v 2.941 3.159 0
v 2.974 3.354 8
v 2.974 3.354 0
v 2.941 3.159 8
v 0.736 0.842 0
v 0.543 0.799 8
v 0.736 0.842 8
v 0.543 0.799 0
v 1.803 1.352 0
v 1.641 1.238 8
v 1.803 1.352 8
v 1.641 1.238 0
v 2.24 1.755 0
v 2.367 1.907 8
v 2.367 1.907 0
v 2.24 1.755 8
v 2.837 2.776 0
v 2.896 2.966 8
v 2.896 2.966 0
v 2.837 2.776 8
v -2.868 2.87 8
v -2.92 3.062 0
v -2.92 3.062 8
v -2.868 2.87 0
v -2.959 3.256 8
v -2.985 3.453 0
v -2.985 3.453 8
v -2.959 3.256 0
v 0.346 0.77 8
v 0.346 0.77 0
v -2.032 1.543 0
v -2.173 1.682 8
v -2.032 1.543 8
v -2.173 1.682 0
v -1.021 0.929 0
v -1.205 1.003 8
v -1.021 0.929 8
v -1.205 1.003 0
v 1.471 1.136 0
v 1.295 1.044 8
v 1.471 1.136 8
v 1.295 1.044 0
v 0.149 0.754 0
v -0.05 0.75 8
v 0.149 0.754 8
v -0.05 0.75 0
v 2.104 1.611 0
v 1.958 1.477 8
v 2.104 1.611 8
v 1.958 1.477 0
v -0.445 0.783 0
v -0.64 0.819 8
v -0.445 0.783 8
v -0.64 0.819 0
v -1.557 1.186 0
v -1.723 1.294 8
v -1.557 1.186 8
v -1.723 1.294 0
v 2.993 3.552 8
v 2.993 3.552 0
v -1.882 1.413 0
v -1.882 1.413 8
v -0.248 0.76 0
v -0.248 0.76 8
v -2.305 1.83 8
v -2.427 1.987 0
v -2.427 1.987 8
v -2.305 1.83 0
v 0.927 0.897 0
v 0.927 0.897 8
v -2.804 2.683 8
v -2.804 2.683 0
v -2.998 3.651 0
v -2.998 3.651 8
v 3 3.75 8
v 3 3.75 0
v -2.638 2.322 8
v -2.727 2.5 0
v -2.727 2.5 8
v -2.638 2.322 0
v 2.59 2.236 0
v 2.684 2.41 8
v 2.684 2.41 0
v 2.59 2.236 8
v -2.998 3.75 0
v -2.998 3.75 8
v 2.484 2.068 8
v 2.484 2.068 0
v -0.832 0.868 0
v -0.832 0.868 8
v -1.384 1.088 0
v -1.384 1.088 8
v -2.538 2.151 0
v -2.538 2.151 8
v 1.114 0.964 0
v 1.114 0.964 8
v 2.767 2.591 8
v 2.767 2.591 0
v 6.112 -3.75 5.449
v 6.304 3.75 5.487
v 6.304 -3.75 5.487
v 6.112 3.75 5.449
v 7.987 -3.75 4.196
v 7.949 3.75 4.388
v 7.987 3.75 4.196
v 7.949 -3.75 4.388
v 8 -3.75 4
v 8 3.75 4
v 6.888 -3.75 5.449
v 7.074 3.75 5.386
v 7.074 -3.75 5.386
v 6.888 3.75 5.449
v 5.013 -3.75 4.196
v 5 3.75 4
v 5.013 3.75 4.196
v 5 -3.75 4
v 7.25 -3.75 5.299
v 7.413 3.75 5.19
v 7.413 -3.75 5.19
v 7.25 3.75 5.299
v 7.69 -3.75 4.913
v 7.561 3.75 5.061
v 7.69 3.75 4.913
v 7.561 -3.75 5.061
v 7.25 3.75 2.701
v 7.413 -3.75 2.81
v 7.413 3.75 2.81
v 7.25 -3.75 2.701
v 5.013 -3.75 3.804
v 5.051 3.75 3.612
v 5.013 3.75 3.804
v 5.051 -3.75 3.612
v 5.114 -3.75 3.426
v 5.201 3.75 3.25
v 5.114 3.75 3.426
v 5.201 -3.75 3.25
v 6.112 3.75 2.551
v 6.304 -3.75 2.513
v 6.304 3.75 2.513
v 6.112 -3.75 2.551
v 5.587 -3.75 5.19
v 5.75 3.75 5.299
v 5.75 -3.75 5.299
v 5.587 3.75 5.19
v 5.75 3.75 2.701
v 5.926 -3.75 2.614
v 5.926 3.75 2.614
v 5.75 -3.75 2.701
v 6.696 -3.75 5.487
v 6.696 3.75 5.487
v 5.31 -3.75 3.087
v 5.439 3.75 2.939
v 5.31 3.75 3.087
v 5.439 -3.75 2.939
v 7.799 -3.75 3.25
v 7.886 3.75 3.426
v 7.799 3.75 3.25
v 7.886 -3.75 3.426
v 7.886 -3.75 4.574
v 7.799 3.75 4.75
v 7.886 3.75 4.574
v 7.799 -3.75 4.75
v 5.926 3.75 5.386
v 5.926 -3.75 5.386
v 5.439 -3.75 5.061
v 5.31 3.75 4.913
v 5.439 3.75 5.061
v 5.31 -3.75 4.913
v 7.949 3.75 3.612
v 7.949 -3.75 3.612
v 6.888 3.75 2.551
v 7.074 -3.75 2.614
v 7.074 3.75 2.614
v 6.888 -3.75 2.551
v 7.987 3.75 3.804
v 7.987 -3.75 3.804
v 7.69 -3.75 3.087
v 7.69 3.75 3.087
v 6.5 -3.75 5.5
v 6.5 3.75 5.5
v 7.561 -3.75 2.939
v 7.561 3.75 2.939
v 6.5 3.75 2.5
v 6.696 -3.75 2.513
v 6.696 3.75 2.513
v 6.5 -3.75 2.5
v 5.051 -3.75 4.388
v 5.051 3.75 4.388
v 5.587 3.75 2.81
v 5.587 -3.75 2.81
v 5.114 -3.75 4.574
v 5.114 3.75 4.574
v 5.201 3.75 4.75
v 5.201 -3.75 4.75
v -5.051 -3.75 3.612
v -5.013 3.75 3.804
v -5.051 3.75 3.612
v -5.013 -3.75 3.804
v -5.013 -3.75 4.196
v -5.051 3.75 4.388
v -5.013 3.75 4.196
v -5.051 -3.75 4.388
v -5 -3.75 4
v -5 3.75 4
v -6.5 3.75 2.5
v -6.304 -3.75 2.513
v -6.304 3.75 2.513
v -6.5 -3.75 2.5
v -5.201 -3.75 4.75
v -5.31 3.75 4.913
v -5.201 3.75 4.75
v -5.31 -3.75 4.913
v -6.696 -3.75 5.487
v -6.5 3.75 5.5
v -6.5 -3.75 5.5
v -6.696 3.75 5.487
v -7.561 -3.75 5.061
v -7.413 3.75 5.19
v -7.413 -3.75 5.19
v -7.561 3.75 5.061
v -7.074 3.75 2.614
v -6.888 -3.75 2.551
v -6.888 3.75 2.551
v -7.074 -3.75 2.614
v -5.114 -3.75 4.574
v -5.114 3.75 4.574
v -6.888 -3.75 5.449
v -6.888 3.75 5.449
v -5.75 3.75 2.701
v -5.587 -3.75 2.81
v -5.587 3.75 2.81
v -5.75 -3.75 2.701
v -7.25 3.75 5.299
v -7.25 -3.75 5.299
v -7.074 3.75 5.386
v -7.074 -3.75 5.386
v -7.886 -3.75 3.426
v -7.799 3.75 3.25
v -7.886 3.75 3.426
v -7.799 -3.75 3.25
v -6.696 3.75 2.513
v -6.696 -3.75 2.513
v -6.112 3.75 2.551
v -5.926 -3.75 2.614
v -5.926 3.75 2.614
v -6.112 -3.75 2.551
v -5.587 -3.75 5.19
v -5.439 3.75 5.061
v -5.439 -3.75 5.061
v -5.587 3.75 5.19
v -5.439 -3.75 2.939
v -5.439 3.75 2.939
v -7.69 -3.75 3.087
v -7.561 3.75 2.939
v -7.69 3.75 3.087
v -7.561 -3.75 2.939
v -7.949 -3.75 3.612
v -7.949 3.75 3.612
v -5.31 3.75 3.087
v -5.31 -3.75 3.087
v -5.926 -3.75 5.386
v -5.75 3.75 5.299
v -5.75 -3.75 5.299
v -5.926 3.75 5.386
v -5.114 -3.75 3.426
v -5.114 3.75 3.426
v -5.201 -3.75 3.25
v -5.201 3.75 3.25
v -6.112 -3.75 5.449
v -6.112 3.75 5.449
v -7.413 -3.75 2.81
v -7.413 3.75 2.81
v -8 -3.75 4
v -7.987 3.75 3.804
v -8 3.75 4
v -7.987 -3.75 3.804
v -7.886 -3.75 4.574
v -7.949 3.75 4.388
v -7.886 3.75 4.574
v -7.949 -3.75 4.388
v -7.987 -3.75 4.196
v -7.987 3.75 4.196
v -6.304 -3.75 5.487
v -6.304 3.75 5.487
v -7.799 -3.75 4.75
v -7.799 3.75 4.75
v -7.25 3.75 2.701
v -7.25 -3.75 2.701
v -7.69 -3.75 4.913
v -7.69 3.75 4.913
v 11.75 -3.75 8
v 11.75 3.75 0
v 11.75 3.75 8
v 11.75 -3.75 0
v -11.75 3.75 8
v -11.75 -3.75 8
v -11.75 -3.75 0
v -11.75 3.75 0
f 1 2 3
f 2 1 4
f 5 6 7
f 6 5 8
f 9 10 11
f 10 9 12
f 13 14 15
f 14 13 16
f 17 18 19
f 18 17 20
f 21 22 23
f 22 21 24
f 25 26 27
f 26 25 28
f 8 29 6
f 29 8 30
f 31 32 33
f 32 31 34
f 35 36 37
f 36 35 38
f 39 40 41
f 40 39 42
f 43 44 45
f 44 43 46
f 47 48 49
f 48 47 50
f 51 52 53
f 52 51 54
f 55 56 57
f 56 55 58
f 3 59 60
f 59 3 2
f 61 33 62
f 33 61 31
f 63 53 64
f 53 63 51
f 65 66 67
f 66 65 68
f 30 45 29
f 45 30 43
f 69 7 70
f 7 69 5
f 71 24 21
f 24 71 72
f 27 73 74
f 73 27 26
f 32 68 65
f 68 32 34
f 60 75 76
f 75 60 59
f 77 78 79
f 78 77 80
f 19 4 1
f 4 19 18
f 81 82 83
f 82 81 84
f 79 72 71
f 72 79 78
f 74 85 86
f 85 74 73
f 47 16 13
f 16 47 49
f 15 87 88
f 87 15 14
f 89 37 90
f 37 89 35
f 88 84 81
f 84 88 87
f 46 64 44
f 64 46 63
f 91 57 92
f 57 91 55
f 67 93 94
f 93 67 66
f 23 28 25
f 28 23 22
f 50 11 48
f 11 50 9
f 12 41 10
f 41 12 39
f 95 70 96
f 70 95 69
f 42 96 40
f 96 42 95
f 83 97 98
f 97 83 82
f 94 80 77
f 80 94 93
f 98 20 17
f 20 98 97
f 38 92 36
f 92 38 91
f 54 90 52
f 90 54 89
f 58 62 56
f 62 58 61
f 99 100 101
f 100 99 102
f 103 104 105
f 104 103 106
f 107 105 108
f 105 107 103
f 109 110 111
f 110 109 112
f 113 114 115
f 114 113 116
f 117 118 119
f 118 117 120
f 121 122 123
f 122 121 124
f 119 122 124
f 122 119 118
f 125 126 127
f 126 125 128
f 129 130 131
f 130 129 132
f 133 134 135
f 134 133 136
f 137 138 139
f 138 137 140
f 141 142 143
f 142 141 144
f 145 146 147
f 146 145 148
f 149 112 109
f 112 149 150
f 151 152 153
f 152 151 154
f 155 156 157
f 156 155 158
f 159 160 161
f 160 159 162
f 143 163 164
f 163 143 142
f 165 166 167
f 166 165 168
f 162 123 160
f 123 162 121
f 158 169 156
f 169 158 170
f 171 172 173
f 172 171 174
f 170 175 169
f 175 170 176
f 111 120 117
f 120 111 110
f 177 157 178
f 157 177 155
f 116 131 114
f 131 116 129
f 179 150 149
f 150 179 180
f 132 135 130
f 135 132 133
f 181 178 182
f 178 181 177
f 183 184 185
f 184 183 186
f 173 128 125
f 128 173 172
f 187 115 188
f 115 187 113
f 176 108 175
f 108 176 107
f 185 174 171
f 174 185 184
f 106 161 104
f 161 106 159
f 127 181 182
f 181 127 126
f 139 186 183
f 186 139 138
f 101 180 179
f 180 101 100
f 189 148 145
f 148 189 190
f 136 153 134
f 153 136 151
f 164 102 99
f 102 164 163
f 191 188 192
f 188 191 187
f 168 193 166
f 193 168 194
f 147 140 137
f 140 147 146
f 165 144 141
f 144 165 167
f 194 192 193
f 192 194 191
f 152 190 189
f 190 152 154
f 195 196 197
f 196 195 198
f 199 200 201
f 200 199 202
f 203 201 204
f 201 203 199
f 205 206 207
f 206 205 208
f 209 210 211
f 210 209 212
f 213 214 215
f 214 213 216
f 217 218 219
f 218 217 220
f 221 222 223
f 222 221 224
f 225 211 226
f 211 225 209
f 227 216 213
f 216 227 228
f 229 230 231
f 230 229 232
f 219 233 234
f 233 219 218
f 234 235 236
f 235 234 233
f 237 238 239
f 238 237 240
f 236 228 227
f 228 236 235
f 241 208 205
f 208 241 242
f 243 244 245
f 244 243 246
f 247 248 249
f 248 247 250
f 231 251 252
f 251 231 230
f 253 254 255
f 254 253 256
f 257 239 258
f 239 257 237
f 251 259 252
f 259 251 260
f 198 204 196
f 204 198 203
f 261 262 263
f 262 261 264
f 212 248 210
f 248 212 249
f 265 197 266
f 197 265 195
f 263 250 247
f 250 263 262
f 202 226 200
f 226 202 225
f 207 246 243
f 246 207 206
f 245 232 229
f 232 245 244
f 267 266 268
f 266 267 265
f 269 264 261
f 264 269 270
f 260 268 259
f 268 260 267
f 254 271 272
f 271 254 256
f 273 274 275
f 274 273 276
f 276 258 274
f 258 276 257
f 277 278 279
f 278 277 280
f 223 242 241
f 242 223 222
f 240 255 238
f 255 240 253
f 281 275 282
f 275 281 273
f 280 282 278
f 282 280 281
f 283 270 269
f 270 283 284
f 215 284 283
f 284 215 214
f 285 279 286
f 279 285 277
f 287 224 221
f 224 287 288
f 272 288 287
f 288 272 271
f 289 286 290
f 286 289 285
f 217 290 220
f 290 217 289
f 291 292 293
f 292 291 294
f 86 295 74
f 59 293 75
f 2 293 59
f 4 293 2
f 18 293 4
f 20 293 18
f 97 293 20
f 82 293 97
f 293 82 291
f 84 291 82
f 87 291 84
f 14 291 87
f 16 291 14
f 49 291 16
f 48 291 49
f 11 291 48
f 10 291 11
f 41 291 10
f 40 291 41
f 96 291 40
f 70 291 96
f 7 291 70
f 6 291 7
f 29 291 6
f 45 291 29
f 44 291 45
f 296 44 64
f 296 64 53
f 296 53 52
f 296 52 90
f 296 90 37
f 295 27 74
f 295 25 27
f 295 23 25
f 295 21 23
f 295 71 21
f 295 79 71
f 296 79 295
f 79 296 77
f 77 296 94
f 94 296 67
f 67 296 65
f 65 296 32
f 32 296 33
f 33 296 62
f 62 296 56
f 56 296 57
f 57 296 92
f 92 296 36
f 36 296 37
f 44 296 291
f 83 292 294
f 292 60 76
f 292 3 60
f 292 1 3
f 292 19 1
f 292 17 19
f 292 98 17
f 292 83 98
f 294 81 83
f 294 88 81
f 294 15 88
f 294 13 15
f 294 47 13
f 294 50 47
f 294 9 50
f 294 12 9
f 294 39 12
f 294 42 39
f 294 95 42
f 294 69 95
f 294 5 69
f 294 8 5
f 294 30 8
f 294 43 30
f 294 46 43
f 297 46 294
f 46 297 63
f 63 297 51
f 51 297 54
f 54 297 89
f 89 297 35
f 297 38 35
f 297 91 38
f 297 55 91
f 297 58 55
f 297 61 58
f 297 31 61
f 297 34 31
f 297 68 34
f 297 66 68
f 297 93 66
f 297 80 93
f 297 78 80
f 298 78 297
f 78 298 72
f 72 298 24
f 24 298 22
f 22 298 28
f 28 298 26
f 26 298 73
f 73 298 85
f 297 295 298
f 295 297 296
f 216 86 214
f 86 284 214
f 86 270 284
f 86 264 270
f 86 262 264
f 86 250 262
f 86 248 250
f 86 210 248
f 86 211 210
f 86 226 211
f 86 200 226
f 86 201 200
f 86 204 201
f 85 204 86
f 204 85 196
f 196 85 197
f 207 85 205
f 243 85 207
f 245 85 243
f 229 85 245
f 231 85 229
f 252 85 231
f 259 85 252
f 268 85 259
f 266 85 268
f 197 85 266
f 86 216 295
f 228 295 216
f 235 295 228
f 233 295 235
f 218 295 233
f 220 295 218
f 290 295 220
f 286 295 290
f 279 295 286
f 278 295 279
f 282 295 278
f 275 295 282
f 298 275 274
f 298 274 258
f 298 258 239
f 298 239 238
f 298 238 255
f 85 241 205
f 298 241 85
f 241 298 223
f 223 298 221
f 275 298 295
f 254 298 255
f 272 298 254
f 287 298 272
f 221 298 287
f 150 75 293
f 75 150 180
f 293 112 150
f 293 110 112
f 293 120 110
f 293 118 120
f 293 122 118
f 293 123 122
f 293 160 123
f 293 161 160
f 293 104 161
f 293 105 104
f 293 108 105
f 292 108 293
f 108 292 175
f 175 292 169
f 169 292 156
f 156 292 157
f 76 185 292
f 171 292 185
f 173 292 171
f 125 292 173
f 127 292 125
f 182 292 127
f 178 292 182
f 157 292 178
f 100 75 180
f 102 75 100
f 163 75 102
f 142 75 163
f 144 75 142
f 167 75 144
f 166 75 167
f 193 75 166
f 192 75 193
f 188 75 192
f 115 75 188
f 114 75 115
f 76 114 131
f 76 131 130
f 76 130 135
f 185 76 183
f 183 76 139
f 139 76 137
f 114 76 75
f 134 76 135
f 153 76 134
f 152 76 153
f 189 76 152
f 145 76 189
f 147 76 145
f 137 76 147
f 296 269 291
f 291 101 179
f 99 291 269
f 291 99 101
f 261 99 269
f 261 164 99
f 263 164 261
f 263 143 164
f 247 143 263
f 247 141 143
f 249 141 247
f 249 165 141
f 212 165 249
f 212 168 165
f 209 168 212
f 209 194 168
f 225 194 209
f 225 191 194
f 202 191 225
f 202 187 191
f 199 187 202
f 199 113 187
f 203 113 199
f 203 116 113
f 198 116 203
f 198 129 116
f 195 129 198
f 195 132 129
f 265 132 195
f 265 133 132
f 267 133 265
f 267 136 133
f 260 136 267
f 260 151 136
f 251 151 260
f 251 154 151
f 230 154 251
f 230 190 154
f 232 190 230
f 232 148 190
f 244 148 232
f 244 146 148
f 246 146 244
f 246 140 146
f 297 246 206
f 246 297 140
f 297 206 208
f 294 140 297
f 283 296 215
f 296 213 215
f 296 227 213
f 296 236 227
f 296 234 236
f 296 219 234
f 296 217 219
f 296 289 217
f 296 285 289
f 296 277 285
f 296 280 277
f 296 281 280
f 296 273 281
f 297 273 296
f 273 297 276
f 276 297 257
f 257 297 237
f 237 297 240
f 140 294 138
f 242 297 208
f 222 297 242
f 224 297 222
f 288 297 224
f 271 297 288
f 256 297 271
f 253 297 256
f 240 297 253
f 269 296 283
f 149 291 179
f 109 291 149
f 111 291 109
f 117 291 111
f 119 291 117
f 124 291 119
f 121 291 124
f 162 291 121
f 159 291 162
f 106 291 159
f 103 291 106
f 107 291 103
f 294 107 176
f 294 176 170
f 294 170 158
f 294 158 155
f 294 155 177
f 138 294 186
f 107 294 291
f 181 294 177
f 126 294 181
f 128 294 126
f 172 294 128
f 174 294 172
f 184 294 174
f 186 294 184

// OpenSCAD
// Parametric Prusa Lower Z Axis Mount clamp
//It is licensed under the Creative Commons - GNU GPL license.
//to be used with on http://www.thingiverse.com/thing:19313
// © 2012 by Mark "Ckaos" Moissette

///////////////////////////////
// USAGE EXAMPLE
///////////////////////////////
mount();
///////////////////////////////
// USER PARAMETERS
///////////////////////////////
$fs=0.2; // def 1, 0.2 is high res
$fa=3;//def 12, 3 is very nice

tolerance = +0.001;

smooth_rod_dia=6;//diameter of the smooth rods
threaded_rod_dia=6;//diameter of the threaded rods
threaded_rod_nut_dia=12.15;
rod_clearance = 2;//"wall" distance around rods

bearing_dia =19.5;
bearing_height=6.05;
bearing_clearance =2;
bearing_indent_dia=13;//diameter of the indent meant to hold the bearing in place

clamp_mount_hole_dia=3;
clamp_mount_hole_length=15;
clamp_mount_nut_dia=6.3;
clamp_mount_nut_height=2.5;


 
// //////////////////////////////
// OpenSCAD SCRIPT
// //////////////////////////////
 module mount()
{
	clamp_mount_hole_dist=max(12,smooth_rod_dia+(rod_clearance*2+clamp_mount_hole_dia));

	block_width=max((bearing_dia+bearing_clearance*2), (clamp_mount_hole_dist+clamp_mount_nut_dia+rod_clearance*2));
	block_height=threaded_rod_dia+rod_clearance;
	block_length=7.5;
	bearing_indent_height=block_height-bearing_height;

	
	translate([0,0,block_height/2])
	difference()
	{
		union()
		{
		cube([block_width, block_length, block_height], center=true);
		
		
		}
		union()
		{	
			//main tr and sr holes
			translate([0,block_length/2,0])
			cylinder(h = bearing_height+bearing_indent_height+1, r1 = smooth_rod_dia/2, r2 = smooth_rod_dia/2, center=true);

			translate([clamp_mount_hole_dist/2,block_length/2+0.1,0])rotate([90,0,0])
			cylinder(h = block_length+tolerance+1, r1 = clamp_mount_hole_dia/2, r2 = clamp_mount_hole_dia/2);

			translate([-clamp_mount_hole_dist/2,block_length/2+0.1,0])rotate([90,0,0])
			cylinder(h = block_length+tolerance+1, r1 = clamp_mount_hole_dia/2, r2 = clamp_mount_hole_dia/2);
	
			
		}
	}

}
